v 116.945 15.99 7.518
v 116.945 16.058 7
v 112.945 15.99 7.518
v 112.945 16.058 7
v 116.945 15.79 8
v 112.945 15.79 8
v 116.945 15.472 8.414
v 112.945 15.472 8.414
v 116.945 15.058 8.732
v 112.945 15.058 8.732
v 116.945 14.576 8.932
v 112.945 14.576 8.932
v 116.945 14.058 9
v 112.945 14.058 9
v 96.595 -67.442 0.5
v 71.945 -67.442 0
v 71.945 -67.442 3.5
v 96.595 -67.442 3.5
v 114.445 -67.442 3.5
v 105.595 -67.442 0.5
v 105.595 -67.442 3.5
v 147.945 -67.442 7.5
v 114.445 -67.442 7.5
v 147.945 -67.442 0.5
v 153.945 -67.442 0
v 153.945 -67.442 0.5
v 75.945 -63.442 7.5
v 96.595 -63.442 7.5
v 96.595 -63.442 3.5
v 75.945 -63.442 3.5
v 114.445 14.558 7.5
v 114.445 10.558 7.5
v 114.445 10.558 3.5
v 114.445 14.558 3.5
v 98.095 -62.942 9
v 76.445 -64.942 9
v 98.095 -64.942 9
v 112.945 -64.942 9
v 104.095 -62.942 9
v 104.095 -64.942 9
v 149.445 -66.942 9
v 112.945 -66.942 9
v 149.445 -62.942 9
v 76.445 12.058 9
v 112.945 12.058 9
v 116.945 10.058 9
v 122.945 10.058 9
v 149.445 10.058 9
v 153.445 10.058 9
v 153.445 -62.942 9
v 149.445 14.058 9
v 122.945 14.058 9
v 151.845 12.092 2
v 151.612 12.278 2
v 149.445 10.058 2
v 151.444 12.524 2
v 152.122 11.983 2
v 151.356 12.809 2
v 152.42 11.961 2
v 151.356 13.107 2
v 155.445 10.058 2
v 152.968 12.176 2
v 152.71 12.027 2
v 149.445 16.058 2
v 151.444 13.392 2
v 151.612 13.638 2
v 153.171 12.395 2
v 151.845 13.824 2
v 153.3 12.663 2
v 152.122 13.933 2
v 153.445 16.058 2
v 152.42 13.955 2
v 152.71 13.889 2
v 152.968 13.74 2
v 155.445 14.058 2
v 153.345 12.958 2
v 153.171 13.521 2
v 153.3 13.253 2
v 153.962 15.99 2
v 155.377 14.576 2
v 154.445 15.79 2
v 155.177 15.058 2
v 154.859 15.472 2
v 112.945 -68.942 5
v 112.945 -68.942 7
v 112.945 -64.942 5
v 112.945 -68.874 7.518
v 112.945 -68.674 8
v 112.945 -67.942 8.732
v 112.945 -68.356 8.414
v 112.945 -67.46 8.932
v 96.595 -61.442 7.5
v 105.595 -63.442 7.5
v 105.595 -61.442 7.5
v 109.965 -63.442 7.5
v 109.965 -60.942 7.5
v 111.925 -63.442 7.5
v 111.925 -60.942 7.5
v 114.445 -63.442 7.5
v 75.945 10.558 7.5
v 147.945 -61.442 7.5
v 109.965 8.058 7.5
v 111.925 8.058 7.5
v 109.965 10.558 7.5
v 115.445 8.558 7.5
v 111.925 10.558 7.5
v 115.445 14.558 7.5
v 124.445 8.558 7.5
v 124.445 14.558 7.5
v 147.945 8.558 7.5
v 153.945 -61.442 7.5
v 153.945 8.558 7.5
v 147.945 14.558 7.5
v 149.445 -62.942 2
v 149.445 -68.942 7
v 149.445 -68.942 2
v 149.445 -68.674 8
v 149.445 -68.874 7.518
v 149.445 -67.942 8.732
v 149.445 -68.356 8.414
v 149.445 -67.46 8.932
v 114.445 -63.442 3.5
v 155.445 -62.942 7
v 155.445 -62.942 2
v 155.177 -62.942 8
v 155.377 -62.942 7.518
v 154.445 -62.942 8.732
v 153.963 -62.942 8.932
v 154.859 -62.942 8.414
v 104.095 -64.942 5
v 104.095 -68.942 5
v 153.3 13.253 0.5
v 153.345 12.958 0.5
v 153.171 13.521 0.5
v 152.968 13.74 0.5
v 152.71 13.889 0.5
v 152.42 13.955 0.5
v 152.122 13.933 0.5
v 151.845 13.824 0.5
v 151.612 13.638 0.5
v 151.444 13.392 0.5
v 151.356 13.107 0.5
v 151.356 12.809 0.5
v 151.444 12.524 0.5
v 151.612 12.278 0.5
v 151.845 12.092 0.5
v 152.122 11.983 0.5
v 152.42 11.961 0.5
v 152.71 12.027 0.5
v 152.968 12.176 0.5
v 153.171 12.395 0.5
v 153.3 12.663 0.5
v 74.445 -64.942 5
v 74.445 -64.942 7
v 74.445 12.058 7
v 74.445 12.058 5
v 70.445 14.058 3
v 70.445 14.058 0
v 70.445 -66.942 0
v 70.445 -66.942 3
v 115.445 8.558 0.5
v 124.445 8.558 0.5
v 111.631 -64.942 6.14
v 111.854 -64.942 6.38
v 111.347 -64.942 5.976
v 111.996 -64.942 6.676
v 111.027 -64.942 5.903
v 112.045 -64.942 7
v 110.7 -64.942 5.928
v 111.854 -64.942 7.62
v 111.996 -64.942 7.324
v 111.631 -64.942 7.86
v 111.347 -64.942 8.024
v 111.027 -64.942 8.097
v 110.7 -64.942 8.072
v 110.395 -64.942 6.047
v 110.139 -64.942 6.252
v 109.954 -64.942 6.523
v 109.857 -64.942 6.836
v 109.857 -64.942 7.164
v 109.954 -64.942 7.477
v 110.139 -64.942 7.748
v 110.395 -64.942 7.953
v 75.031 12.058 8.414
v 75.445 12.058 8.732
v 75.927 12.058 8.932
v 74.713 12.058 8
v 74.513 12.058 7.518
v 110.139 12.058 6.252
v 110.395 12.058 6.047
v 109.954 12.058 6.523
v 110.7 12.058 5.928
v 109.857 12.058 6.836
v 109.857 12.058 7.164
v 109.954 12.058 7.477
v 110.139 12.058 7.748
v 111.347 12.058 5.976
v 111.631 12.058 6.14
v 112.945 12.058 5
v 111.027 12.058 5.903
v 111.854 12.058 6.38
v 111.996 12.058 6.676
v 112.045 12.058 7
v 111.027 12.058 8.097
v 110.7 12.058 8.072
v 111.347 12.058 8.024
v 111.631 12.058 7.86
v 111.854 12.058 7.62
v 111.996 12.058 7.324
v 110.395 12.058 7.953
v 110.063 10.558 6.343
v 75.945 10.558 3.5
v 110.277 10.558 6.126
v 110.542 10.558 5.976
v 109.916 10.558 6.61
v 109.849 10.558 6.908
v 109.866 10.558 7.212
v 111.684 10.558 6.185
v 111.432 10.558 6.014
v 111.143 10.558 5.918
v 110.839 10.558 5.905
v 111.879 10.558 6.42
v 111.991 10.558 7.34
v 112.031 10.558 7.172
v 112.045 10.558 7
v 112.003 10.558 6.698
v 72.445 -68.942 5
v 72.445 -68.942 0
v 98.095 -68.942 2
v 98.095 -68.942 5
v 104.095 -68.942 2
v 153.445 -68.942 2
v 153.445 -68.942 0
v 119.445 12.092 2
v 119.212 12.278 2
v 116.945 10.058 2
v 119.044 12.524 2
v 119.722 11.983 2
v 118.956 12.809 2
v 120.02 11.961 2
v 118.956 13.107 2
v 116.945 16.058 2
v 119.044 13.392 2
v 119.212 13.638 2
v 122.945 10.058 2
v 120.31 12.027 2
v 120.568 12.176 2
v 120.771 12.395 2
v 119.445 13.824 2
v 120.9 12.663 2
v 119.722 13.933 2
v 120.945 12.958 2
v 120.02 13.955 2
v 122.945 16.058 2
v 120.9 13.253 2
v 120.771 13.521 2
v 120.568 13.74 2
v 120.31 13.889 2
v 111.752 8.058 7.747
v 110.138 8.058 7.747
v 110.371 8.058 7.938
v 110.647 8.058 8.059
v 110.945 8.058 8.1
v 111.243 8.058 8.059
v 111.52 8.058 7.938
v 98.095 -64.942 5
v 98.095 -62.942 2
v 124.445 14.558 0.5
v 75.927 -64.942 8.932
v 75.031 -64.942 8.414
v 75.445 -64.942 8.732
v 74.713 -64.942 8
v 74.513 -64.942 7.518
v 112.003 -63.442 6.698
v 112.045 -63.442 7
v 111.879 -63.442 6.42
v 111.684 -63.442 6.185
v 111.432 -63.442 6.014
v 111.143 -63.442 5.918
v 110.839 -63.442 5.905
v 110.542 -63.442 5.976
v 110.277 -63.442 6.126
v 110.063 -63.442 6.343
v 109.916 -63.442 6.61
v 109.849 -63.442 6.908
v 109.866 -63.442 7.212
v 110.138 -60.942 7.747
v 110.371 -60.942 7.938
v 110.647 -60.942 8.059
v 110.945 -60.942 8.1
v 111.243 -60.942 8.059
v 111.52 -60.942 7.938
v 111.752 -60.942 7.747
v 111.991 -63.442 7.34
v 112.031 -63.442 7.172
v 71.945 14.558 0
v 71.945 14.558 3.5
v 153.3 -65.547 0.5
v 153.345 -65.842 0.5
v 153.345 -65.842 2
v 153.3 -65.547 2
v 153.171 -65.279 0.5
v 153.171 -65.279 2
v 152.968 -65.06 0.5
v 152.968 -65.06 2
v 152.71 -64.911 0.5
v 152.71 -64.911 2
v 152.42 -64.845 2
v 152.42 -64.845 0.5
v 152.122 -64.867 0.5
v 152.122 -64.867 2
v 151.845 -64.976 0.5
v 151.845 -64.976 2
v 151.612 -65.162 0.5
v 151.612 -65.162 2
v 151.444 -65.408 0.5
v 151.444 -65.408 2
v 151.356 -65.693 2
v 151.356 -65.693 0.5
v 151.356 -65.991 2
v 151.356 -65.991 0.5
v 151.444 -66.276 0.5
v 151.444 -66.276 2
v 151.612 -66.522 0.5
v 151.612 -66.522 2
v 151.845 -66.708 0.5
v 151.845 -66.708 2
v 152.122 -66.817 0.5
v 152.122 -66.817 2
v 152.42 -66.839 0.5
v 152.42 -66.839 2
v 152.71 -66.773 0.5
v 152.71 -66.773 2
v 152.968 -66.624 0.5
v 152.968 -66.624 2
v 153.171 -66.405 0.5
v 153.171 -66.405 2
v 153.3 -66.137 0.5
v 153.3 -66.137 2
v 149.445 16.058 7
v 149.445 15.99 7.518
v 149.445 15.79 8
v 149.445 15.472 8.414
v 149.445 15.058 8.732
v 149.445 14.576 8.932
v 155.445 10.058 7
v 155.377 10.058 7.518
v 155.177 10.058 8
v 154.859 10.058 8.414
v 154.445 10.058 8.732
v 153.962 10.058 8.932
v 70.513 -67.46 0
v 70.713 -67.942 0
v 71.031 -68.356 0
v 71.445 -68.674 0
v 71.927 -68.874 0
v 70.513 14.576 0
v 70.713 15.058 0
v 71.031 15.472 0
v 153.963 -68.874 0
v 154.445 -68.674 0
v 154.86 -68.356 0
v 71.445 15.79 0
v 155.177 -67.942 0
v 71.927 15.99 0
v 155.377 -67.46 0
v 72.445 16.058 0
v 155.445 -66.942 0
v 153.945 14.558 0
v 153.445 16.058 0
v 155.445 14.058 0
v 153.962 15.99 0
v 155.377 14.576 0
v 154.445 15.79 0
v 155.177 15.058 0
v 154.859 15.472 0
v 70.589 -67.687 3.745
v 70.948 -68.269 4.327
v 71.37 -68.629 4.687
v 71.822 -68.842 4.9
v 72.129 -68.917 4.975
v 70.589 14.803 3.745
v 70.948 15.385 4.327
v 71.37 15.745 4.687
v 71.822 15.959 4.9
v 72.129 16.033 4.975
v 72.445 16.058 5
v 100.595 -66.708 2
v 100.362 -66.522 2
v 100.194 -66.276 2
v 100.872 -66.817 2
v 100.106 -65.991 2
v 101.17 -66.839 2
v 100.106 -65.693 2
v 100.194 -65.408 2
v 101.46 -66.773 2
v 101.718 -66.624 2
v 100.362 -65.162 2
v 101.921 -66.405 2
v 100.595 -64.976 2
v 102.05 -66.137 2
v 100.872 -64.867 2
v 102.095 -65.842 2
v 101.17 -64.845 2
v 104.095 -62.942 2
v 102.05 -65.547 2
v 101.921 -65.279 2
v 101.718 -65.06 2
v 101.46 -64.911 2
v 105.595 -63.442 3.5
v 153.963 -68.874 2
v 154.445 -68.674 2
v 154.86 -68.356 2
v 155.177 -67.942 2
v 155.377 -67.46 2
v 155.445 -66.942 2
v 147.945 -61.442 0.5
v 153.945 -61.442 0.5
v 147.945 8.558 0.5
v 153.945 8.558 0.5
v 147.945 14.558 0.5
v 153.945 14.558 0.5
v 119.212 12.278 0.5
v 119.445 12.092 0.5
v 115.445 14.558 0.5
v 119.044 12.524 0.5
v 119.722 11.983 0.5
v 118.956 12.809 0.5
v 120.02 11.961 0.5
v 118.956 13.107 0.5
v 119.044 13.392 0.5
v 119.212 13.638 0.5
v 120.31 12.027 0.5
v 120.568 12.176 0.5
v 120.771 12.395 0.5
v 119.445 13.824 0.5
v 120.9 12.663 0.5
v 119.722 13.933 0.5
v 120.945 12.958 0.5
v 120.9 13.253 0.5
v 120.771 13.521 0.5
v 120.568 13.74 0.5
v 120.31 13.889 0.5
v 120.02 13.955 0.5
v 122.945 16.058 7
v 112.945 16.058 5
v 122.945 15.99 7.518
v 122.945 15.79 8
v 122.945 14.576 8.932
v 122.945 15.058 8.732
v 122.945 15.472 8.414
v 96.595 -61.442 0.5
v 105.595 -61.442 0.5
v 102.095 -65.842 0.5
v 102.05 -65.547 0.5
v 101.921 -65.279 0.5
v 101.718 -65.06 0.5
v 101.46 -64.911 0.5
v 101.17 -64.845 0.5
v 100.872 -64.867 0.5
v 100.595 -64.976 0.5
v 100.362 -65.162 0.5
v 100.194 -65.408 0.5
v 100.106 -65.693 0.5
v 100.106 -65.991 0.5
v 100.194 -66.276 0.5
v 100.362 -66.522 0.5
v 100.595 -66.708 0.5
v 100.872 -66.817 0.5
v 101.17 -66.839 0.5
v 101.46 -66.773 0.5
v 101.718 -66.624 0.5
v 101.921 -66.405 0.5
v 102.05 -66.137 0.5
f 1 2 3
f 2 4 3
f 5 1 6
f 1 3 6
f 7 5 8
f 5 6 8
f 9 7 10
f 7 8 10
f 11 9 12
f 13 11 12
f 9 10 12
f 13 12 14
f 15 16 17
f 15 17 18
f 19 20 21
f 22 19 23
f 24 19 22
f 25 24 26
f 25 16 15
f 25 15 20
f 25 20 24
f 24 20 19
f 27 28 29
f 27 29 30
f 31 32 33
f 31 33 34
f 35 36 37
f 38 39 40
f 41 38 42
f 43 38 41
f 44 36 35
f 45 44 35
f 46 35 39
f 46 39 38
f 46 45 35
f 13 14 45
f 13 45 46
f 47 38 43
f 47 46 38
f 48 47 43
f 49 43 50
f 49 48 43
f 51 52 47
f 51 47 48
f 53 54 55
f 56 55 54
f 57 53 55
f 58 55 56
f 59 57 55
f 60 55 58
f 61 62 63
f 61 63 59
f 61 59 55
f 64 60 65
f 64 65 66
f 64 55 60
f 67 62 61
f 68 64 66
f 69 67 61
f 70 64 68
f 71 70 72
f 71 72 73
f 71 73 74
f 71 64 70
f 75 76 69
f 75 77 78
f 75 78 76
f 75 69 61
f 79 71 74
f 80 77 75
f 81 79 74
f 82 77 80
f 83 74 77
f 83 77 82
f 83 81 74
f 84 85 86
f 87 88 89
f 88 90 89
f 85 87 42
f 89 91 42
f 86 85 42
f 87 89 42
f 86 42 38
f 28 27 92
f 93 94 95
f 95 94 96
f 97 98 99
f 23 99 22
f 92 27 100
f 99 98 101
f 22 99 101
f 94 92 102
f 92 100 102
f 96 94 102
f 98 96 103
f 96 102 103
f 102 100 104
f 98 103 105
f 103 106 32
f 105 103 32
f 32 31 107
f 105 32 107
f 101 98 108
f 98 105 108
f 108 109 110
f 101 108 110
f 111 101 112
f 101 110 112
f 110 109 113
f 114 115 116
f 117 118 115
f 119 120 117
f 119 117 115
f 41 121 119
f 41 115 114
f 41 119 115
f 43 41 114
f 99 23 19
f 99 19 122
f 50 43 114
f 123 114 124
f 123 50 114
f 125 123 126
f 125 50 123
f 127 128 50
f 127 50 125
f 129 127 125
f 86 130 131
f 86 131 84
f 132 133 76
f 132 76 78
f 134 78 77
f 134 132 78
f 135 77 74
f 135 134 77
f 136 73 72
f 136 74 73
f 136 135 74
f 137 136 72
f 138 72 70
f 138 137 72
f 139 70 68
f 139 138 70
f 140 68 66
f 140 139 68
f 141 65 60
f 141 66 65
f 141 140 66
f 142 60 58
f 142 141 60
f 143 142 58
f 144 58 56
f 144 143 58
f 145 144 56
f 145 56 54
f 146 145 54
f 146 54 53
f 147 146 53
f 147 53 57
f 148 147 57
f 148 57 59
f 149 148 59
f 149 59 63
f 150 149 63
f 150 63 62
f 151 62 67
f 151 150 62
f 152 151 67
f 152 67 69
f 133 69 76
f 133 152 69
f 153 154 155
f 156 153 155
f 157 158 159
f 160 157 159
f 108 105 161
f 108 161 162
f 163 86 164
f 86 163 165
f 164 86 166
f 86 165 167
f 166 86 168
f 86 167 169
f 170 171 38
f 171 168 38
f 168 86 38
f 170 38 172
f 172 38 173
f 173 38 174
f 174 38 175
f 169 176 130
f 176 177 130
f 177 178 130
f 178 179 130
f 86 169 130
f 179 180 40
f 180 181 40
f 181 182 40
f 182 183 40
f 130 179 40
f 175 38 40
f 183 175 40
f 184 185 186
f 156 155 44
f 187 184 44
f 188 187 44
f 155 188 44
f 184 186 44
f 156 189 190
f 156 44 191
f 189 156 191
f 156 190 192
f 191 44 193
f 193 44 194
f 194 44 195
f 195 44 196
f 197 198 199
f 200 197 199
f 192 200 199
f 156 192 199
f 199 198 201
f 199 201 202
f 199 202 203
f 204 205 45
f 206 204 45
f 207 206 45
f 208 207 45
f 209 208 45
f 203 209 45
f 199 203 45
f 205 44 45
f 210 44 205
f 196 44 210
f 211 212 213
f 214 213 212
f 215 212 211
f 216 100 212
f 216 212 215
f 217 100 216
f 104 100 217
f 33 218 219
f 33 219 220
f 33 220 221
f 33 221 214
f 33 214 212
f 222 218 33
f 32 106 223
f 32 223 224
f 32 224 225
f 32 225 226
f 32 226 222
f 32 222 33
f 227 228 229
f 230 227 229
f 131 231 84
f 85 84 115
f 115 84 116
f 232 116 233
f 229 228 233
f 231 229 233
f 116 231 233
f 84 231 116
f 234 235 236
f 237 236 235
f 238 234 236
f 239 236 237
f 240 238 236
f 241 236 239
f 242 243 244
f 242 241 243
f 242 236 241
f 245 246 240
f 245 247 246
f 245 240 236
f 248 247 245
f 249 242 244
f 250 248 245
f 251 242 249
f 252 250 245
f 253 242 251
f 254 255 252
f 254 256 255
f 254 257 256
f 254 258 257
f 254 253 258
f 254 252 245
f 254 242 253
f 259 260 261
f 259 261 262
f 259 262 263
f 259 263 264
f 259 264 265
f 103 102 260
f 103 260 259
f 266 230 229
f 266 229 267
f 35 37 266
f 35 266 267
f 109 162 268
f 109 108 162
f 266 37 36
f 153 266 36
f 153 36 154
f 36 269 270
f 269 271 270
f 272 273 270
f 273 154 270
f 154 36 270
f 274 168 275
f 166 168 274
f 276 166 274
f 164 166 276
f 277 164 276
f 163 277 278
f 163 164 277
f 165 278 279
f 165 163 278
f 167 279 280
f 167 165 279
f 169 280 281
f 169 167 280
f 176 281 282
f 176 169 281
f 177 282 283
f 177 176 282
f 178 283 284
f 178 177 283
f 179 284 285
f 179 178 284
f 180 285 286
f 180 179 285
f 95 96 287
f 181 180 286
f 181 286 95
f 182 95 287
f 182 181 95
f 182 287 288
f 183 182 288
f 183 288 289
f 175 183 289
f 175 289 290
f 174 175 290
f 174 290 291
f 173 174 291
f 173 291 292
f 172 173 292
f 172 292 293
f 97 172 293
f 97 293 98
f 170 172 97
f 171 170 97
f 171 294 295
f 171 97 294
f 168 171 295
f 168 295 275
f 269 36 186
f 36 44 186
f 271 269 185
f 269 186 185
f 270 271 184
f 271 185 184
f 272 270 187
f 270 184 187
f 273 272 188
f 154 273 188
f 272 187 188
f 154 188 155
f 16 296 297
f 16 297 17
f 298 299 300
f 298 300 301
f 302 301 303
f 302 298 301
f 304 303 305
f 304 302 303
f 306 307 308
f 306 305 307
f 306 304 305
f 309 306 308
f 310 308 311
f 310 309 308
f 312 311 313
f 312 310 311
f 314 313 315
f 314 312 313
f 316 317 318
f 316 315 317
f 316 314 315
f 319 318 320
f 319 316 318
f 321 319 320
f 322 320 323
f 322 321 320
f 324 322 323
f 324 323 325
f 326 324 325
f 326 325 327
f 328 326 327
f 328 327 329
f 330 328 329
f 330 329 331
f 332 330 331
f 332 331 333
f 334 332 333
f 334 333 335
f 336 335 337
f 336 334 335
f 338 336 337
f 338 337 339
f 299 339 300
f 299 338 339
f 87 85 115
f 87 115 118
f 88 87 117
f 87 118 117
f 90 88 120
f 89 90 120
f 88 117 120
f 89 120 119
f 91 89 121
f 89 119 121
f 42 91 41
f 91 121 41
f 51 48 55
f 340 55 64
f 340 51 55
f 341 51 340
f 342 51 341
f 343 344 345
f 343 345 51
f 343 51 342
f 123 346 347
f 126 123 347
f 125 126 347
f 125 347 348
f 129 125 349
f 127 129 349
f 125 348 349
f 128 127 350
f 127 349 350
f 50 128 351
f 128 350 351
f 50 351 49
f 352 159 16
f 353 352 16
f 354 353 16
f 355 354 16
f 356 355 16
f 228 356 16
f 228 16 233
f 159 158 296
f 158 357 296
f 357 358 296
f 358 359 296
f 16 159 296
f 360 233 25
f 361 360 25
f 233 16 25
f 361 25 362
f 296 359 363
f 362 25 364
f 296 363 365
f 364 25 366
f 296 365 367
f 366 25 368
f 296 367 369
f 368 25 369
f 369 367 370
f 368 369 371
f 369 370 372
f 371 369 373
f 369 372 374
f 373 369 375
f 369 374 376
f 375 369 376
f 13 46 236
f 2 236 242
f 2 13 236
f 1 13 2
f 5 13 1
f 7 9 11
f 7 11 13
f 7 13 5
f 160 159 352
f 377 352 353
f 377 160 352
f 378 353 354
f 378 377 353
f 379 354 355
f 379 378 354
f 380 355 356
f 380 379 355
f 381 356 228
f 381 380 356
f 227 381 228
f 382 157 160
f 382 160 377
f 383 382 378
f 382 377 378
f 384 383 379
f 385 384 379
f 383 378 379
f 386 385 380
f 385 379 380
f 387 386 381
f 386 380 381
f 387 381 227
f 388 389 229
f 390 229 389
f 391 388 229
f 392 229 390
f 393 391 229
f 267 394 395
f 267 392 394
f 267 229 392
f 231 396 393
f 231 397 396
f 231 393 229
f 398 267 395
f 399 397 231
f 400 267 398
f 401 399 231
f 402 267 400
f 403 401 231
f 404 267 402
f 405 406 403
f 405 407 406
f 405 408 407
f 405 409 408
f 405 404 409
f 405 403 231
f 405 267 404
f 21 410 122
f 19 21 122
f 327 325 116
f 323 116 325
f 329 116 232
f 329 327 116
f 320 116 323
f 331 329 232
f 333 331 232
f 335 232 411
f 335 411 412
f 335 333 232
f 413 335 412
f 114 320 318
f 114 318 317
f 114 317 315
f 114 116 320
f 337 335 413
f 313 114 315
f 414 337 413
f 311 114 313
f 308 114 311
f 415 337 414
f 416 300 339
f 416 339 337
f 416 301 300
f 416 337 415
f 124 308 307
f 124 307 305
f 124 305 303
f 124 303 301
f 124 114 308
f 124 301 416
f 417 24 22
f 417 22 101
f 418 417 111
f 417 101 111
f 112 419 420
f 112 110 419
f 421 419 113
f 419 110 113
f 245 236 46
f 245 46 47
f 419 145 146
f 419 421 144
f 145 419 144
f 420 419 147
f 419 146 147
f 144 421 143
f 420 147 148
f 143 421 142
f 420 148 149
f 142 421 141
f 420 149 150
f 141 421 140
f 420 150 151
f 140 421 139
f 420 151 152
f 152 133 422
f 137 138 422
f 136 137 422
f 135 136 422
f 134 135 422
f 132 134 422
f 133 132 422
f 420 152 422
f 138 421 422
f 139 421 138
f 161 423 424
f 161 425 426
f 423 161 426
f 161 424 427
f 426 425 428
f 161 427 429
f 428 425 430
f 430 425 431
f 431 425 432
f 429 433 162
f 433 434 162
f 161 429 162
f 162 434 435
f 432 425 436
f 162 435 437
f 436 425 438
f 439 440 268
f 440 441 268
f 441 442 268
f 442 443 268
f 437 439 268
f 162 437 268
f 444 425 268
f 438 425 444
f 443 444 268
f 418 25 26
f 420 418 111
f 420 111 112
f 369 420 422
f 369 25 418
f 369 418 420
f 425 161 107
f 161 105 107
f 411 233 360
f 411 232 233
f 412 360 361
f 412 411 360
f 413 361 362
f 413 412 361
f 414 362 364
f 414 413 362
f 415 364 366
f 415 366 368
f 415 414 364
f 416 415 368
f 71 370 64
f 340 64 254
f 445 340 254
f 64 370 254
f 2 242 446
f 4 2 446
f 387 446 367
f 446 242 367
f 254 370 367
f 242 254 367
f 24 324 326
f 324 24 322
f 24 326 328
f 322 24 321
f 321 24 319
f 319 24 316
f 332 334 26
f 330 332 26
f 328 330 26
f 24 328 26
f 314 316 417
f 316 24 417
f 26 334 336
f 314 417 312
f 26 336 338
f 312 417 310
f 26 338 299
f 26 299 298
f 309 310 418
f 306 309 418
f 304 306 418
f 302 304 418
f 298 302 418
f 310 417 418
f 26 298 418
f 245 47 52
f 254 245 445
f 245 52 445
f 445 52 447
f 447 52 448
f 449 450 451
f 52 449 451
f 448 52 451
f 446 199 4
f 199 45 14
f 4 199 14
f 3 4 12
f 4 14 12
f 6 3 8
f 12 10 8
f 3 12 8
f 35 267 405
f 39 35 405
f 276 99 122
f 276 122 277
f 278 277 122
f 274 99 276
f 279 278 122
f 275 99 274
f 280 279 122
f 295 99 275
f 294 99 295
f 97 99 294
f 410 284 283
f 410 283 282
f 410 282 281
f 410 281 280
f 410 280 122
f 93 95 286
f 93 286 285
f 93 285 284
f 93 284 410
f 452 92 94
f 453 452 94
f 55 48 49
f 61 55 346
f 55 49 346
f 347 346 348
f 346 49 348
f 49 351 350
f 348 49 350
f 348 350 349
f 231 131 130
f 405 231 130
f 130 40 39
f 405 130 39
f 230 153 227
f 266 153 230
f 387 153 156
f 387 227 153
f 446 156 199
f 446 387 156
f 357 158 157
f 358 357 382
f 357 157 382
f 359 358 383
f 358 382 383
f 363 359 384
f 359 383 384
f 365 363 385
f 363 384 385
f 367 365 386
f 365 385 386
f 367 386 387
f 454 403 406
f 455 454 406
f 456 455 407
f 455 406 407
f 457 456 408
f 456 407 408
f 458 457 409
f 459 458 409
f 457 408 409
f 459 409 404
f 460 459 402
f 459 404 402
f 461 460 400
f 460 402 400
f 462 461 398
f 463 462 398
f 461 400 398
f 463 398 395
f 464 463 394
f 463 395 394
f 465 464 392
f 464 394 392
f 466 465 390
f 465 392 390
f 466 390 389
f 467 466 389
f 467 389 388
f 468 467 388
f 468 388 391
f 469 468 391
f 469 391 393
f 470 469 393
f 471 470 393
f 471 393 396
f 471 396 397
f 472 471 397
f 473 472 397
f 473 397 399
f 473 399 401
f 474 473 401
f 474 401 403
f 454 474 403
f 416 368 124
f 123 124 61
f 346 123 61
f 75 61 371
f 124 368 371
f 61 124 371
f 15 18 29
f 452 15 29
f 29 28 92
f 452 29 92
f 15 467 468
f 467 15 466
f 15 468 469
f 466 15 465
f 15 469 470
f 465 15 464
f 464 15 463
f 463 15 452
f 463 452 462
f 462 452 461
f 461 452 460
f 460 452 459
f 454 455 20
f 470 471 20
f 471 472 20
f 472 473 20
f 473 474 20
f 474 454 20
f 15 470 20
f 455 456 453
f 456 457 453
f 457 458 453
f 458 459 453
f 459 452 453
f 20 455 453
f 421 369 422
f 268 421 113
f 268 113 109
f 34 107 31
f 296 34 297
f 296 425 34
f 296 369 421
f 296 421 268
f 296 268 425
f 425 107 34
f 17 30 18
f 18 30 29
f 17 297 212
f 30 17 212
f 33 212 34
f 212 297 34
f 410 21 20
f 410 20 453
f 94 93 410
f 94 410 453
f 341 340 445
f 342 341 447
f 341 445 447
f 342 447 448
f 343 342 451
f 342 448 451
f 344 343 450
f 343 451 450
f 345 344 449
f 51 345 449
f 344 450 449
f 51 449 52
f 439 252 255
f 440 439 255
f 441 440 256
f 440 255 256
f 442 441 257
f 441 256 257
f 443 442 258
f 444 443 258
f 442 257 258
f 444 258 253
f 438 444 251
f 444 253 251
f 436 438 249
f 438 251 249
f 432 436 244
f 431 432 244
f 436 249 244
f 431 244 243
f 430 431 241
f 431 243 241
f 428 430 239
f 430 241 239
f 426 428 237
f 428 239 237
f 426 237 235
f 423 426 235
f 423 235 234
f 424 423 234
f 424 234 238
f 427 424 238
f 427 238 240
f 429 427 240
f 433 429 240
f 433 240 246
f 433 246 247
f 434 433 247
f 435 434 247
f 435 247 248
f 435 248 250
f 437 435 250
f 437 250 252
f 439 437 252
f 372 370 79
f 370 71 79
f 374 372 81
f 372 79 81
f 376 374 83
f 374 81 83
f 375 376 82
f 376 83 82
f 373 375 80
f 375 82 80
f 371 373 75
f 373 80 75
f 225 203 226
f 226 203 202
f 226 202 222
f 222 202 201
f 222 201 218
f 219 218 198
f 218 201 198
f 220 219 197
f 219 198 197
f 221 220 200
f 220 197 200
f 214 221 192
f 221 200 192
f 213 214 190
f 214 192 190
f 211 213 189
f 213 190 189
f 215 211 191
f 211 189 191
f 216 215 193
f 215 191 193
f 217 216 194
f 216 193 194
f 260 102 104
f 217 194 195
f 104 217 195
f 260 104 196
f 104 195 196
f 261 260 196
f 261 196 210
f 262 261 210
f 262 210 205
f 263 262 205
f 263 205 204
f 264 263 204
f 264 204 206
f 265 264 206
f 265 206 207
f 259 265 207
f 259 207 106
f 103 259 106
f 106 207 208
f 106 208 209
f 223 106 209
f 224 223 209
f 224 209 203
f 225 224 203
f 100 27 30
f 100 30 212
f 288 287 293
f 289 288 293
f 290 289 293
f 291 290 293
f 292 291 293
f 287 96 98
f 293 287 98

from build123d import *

# Parameters (mm, degrees)
EXTRUDE_1_DEPTH     = 9
CUT_EXTRUDE_2_DEPTH = 4
SKETCH_7_W          = 6
SKETCH_7_H          = 6
CUT_EXTRUDE_4_DEPTH = 7
SKETCH_10_W         = 6
SKETCH_10_H         = 6
CUT_EXTRUDE_6_DEPTH = 7
SHELL_1_T           = -1.5
SKETCH_5_R          = 1.1
CUT_EXTRUDE_3_DEPTH = 4
CUT_EXTRUDE_START   = -9
SKETCH_6_R          = 1
CUT_EXTRUDE_5_DEPTH = 7.5
FILLET_1_R          = 2
CUT_EXTRUDE_7_REACH = 4
SKETCH_12_R         = 1


with BuildPart() as part:
    # 草图1 → 凸台-拉伸1 (new body)
    with BuildSketch(Plane.XY):
        Polygon((70.444808084, 16.058078986), (70.444808084, -68.941921014), (155.445322416, -68.941921014), (155.444808084, 16.058078986), align=None)
    extrude(amount=EXTRUDE_1_DEPTH)

    # 草图4 → 支架切除-拉伸2 (cut)
    with BuildSketch(Plane.XY.offset(9)):
        Polygon((112.94506525, 16.058078986), (70.444808084, 16.058078986), (70.444808084, -68.941921014), (112.94506525, -68.941921014), (112.94506525, -64.941921014), (74.444808084, -64.941921014), (74.444808084, 12.058078986), (112.94506525, 12.058078986), align=None)
    extrude(amount=-CUT_EXTRUDE_2_DEPTH, mode=Mode.SUBTRACT)

    # 草图7 → 顶螺丝切除-拉伸4 (cut)
    with BuildSketch(Plane.XY.offset(9)):
        with Locations((152.445322416, 13.058078986)):
            Rectangle(SKETCH_7_W, SKETCH_7_H)
        with Locations((152.445322416, -65.941921014)):
            Rectangle(SKETCH_7_W, SKETCH_7_H)
    extrude(amount=-CUT_EXTRUDE_4_DEPTH, mode=Mode.SUBTRACT)

    # 草图10 → 底螺丝切除-拉伸6 (cut)
    with BuildSketch(Plane.XY.offset(9)):
        with Locations((119.944808084, 13.058078986)):
            Rectangle(SKETCH_10_W, SKETCH_10_H)
        with Locations((101.094808084, -65.941921014)):
            Rectangle(SKETCH_10_W, SKETCH_10_H)
    extrude(amount=-CUT_EXTRUDE_6_DEPTH, mode=Mode.SUBTRACT)

    # 抽壳1
    shell_1_openings = [part.faces().sort_by_distance(p)[0] for p in [
        (112.94506525, -26.441921014, 0),
    ]]
    offset(amount=SHELL_1_T, openings=shell_1_openings, kind=Kind.INTERSECTION)

    # 草图5 → 切除-拉伸3 (cut)
    with BuildSketch(Plane(origin=(0, 12.058078986, 0), x_dir=(1, 0, 0), z_dir=(0, 1, 0))):
        with Locations((110.94506525, -7)):
            Circle(SKETCH_5_R)
    cut_extrude_3 = extrude(amount=-CUT_EXTRUDE_3_DEPTH, mode=Mode.SUBTRACT)

    # 镜向1: 切除-拉伸3 across plane
    add(cut_extrude_3.mirror(Plane.ZX.offset(-26.441921014)), mode=Mode.SUBTRACT)

    # 草图6 → 顶螺丝切除-拉伸5 (cut)
    with BuildSketch(Plane.XY.offset(9).offset(CUT_EXTRUDE_START)):
        with Locations((152.344808084, 12.958078986)):
            Circle(SKETCH_6_R)
        with Locations((152.344808084, -65.841921014)):
            Circle(SKETCH_6_R)
    extrude(amount=CUT_EXTRUDE_5_DEPTH, mode=Mode.SUBTRACT)

    # 圆角1
    fillet_1_edges = [part.edges().sort_by_distance(p)[0] for p in [
        (131.195193833, -68.941921014, 9),
        (70.444808084, 16.058078986, 2.5),
        (70.444808084, -68.941921014, 2.5),
        (70.444808084, -26.441921014, 5),
        (74.444808084, -26.441921014, 9),
        (155.44506525, -26.441921014, 9),
        (136.19506525, 16.058078986, 9),
        (155.444808084, 16.058078986, 1),
        (155.445322416, -68.941921014, 1),
        (114.944936667, 16.058078986, 9),
    ]]
    fillet(fillet_1_edges, radius=FILLET_1_R)

    # 草图12 → 底螺丝切除-拉伸7 (cut, up to next)
    with BuildSketch(Plane.XY.offset(2), mode=Mode.PRIVATE) as cut_extrude_7_sk1:
        with Locations((119.944808084, 12.958078986)):
            Circle(SKETCH_12_R)
    cut_extrude_7_tool1 = extrude(cut_extrude_7_sk1.sketch, amount=-CUT_EXTRUDE_7_REACH, mode=Mode.PRIVATE) & part.part
    add(cut_extrude_7_tool1.solids().sort_by_distance((119.944808, 12.958079, 2))[0], mode=Mode.SUBTRACT)
    # 草图12 → 底螺丝切除-拉伸7 (cut, up to next)
    with BuildSketch(Plane.XY.offset(2), mode=Mode.PRIVATE) as cut_extrude_7_sk2:
        with Locations((101.094808084, -65.841921014)):
            Circle(SKETCH_12_R)
    cut_extrude_7_tool2 = extrude(cut_extrude_7_sk2.sketch, amount=-CUT_EXTRUDE_7_REACH, mode=Mode.PRIVATE) & part.part
    add(cut_extrude_7_tool2.solids().sort_by_distance((101.094808, -65.841921, 2))[0], mode=Mode.SUBTRACT)


solid = part.part
